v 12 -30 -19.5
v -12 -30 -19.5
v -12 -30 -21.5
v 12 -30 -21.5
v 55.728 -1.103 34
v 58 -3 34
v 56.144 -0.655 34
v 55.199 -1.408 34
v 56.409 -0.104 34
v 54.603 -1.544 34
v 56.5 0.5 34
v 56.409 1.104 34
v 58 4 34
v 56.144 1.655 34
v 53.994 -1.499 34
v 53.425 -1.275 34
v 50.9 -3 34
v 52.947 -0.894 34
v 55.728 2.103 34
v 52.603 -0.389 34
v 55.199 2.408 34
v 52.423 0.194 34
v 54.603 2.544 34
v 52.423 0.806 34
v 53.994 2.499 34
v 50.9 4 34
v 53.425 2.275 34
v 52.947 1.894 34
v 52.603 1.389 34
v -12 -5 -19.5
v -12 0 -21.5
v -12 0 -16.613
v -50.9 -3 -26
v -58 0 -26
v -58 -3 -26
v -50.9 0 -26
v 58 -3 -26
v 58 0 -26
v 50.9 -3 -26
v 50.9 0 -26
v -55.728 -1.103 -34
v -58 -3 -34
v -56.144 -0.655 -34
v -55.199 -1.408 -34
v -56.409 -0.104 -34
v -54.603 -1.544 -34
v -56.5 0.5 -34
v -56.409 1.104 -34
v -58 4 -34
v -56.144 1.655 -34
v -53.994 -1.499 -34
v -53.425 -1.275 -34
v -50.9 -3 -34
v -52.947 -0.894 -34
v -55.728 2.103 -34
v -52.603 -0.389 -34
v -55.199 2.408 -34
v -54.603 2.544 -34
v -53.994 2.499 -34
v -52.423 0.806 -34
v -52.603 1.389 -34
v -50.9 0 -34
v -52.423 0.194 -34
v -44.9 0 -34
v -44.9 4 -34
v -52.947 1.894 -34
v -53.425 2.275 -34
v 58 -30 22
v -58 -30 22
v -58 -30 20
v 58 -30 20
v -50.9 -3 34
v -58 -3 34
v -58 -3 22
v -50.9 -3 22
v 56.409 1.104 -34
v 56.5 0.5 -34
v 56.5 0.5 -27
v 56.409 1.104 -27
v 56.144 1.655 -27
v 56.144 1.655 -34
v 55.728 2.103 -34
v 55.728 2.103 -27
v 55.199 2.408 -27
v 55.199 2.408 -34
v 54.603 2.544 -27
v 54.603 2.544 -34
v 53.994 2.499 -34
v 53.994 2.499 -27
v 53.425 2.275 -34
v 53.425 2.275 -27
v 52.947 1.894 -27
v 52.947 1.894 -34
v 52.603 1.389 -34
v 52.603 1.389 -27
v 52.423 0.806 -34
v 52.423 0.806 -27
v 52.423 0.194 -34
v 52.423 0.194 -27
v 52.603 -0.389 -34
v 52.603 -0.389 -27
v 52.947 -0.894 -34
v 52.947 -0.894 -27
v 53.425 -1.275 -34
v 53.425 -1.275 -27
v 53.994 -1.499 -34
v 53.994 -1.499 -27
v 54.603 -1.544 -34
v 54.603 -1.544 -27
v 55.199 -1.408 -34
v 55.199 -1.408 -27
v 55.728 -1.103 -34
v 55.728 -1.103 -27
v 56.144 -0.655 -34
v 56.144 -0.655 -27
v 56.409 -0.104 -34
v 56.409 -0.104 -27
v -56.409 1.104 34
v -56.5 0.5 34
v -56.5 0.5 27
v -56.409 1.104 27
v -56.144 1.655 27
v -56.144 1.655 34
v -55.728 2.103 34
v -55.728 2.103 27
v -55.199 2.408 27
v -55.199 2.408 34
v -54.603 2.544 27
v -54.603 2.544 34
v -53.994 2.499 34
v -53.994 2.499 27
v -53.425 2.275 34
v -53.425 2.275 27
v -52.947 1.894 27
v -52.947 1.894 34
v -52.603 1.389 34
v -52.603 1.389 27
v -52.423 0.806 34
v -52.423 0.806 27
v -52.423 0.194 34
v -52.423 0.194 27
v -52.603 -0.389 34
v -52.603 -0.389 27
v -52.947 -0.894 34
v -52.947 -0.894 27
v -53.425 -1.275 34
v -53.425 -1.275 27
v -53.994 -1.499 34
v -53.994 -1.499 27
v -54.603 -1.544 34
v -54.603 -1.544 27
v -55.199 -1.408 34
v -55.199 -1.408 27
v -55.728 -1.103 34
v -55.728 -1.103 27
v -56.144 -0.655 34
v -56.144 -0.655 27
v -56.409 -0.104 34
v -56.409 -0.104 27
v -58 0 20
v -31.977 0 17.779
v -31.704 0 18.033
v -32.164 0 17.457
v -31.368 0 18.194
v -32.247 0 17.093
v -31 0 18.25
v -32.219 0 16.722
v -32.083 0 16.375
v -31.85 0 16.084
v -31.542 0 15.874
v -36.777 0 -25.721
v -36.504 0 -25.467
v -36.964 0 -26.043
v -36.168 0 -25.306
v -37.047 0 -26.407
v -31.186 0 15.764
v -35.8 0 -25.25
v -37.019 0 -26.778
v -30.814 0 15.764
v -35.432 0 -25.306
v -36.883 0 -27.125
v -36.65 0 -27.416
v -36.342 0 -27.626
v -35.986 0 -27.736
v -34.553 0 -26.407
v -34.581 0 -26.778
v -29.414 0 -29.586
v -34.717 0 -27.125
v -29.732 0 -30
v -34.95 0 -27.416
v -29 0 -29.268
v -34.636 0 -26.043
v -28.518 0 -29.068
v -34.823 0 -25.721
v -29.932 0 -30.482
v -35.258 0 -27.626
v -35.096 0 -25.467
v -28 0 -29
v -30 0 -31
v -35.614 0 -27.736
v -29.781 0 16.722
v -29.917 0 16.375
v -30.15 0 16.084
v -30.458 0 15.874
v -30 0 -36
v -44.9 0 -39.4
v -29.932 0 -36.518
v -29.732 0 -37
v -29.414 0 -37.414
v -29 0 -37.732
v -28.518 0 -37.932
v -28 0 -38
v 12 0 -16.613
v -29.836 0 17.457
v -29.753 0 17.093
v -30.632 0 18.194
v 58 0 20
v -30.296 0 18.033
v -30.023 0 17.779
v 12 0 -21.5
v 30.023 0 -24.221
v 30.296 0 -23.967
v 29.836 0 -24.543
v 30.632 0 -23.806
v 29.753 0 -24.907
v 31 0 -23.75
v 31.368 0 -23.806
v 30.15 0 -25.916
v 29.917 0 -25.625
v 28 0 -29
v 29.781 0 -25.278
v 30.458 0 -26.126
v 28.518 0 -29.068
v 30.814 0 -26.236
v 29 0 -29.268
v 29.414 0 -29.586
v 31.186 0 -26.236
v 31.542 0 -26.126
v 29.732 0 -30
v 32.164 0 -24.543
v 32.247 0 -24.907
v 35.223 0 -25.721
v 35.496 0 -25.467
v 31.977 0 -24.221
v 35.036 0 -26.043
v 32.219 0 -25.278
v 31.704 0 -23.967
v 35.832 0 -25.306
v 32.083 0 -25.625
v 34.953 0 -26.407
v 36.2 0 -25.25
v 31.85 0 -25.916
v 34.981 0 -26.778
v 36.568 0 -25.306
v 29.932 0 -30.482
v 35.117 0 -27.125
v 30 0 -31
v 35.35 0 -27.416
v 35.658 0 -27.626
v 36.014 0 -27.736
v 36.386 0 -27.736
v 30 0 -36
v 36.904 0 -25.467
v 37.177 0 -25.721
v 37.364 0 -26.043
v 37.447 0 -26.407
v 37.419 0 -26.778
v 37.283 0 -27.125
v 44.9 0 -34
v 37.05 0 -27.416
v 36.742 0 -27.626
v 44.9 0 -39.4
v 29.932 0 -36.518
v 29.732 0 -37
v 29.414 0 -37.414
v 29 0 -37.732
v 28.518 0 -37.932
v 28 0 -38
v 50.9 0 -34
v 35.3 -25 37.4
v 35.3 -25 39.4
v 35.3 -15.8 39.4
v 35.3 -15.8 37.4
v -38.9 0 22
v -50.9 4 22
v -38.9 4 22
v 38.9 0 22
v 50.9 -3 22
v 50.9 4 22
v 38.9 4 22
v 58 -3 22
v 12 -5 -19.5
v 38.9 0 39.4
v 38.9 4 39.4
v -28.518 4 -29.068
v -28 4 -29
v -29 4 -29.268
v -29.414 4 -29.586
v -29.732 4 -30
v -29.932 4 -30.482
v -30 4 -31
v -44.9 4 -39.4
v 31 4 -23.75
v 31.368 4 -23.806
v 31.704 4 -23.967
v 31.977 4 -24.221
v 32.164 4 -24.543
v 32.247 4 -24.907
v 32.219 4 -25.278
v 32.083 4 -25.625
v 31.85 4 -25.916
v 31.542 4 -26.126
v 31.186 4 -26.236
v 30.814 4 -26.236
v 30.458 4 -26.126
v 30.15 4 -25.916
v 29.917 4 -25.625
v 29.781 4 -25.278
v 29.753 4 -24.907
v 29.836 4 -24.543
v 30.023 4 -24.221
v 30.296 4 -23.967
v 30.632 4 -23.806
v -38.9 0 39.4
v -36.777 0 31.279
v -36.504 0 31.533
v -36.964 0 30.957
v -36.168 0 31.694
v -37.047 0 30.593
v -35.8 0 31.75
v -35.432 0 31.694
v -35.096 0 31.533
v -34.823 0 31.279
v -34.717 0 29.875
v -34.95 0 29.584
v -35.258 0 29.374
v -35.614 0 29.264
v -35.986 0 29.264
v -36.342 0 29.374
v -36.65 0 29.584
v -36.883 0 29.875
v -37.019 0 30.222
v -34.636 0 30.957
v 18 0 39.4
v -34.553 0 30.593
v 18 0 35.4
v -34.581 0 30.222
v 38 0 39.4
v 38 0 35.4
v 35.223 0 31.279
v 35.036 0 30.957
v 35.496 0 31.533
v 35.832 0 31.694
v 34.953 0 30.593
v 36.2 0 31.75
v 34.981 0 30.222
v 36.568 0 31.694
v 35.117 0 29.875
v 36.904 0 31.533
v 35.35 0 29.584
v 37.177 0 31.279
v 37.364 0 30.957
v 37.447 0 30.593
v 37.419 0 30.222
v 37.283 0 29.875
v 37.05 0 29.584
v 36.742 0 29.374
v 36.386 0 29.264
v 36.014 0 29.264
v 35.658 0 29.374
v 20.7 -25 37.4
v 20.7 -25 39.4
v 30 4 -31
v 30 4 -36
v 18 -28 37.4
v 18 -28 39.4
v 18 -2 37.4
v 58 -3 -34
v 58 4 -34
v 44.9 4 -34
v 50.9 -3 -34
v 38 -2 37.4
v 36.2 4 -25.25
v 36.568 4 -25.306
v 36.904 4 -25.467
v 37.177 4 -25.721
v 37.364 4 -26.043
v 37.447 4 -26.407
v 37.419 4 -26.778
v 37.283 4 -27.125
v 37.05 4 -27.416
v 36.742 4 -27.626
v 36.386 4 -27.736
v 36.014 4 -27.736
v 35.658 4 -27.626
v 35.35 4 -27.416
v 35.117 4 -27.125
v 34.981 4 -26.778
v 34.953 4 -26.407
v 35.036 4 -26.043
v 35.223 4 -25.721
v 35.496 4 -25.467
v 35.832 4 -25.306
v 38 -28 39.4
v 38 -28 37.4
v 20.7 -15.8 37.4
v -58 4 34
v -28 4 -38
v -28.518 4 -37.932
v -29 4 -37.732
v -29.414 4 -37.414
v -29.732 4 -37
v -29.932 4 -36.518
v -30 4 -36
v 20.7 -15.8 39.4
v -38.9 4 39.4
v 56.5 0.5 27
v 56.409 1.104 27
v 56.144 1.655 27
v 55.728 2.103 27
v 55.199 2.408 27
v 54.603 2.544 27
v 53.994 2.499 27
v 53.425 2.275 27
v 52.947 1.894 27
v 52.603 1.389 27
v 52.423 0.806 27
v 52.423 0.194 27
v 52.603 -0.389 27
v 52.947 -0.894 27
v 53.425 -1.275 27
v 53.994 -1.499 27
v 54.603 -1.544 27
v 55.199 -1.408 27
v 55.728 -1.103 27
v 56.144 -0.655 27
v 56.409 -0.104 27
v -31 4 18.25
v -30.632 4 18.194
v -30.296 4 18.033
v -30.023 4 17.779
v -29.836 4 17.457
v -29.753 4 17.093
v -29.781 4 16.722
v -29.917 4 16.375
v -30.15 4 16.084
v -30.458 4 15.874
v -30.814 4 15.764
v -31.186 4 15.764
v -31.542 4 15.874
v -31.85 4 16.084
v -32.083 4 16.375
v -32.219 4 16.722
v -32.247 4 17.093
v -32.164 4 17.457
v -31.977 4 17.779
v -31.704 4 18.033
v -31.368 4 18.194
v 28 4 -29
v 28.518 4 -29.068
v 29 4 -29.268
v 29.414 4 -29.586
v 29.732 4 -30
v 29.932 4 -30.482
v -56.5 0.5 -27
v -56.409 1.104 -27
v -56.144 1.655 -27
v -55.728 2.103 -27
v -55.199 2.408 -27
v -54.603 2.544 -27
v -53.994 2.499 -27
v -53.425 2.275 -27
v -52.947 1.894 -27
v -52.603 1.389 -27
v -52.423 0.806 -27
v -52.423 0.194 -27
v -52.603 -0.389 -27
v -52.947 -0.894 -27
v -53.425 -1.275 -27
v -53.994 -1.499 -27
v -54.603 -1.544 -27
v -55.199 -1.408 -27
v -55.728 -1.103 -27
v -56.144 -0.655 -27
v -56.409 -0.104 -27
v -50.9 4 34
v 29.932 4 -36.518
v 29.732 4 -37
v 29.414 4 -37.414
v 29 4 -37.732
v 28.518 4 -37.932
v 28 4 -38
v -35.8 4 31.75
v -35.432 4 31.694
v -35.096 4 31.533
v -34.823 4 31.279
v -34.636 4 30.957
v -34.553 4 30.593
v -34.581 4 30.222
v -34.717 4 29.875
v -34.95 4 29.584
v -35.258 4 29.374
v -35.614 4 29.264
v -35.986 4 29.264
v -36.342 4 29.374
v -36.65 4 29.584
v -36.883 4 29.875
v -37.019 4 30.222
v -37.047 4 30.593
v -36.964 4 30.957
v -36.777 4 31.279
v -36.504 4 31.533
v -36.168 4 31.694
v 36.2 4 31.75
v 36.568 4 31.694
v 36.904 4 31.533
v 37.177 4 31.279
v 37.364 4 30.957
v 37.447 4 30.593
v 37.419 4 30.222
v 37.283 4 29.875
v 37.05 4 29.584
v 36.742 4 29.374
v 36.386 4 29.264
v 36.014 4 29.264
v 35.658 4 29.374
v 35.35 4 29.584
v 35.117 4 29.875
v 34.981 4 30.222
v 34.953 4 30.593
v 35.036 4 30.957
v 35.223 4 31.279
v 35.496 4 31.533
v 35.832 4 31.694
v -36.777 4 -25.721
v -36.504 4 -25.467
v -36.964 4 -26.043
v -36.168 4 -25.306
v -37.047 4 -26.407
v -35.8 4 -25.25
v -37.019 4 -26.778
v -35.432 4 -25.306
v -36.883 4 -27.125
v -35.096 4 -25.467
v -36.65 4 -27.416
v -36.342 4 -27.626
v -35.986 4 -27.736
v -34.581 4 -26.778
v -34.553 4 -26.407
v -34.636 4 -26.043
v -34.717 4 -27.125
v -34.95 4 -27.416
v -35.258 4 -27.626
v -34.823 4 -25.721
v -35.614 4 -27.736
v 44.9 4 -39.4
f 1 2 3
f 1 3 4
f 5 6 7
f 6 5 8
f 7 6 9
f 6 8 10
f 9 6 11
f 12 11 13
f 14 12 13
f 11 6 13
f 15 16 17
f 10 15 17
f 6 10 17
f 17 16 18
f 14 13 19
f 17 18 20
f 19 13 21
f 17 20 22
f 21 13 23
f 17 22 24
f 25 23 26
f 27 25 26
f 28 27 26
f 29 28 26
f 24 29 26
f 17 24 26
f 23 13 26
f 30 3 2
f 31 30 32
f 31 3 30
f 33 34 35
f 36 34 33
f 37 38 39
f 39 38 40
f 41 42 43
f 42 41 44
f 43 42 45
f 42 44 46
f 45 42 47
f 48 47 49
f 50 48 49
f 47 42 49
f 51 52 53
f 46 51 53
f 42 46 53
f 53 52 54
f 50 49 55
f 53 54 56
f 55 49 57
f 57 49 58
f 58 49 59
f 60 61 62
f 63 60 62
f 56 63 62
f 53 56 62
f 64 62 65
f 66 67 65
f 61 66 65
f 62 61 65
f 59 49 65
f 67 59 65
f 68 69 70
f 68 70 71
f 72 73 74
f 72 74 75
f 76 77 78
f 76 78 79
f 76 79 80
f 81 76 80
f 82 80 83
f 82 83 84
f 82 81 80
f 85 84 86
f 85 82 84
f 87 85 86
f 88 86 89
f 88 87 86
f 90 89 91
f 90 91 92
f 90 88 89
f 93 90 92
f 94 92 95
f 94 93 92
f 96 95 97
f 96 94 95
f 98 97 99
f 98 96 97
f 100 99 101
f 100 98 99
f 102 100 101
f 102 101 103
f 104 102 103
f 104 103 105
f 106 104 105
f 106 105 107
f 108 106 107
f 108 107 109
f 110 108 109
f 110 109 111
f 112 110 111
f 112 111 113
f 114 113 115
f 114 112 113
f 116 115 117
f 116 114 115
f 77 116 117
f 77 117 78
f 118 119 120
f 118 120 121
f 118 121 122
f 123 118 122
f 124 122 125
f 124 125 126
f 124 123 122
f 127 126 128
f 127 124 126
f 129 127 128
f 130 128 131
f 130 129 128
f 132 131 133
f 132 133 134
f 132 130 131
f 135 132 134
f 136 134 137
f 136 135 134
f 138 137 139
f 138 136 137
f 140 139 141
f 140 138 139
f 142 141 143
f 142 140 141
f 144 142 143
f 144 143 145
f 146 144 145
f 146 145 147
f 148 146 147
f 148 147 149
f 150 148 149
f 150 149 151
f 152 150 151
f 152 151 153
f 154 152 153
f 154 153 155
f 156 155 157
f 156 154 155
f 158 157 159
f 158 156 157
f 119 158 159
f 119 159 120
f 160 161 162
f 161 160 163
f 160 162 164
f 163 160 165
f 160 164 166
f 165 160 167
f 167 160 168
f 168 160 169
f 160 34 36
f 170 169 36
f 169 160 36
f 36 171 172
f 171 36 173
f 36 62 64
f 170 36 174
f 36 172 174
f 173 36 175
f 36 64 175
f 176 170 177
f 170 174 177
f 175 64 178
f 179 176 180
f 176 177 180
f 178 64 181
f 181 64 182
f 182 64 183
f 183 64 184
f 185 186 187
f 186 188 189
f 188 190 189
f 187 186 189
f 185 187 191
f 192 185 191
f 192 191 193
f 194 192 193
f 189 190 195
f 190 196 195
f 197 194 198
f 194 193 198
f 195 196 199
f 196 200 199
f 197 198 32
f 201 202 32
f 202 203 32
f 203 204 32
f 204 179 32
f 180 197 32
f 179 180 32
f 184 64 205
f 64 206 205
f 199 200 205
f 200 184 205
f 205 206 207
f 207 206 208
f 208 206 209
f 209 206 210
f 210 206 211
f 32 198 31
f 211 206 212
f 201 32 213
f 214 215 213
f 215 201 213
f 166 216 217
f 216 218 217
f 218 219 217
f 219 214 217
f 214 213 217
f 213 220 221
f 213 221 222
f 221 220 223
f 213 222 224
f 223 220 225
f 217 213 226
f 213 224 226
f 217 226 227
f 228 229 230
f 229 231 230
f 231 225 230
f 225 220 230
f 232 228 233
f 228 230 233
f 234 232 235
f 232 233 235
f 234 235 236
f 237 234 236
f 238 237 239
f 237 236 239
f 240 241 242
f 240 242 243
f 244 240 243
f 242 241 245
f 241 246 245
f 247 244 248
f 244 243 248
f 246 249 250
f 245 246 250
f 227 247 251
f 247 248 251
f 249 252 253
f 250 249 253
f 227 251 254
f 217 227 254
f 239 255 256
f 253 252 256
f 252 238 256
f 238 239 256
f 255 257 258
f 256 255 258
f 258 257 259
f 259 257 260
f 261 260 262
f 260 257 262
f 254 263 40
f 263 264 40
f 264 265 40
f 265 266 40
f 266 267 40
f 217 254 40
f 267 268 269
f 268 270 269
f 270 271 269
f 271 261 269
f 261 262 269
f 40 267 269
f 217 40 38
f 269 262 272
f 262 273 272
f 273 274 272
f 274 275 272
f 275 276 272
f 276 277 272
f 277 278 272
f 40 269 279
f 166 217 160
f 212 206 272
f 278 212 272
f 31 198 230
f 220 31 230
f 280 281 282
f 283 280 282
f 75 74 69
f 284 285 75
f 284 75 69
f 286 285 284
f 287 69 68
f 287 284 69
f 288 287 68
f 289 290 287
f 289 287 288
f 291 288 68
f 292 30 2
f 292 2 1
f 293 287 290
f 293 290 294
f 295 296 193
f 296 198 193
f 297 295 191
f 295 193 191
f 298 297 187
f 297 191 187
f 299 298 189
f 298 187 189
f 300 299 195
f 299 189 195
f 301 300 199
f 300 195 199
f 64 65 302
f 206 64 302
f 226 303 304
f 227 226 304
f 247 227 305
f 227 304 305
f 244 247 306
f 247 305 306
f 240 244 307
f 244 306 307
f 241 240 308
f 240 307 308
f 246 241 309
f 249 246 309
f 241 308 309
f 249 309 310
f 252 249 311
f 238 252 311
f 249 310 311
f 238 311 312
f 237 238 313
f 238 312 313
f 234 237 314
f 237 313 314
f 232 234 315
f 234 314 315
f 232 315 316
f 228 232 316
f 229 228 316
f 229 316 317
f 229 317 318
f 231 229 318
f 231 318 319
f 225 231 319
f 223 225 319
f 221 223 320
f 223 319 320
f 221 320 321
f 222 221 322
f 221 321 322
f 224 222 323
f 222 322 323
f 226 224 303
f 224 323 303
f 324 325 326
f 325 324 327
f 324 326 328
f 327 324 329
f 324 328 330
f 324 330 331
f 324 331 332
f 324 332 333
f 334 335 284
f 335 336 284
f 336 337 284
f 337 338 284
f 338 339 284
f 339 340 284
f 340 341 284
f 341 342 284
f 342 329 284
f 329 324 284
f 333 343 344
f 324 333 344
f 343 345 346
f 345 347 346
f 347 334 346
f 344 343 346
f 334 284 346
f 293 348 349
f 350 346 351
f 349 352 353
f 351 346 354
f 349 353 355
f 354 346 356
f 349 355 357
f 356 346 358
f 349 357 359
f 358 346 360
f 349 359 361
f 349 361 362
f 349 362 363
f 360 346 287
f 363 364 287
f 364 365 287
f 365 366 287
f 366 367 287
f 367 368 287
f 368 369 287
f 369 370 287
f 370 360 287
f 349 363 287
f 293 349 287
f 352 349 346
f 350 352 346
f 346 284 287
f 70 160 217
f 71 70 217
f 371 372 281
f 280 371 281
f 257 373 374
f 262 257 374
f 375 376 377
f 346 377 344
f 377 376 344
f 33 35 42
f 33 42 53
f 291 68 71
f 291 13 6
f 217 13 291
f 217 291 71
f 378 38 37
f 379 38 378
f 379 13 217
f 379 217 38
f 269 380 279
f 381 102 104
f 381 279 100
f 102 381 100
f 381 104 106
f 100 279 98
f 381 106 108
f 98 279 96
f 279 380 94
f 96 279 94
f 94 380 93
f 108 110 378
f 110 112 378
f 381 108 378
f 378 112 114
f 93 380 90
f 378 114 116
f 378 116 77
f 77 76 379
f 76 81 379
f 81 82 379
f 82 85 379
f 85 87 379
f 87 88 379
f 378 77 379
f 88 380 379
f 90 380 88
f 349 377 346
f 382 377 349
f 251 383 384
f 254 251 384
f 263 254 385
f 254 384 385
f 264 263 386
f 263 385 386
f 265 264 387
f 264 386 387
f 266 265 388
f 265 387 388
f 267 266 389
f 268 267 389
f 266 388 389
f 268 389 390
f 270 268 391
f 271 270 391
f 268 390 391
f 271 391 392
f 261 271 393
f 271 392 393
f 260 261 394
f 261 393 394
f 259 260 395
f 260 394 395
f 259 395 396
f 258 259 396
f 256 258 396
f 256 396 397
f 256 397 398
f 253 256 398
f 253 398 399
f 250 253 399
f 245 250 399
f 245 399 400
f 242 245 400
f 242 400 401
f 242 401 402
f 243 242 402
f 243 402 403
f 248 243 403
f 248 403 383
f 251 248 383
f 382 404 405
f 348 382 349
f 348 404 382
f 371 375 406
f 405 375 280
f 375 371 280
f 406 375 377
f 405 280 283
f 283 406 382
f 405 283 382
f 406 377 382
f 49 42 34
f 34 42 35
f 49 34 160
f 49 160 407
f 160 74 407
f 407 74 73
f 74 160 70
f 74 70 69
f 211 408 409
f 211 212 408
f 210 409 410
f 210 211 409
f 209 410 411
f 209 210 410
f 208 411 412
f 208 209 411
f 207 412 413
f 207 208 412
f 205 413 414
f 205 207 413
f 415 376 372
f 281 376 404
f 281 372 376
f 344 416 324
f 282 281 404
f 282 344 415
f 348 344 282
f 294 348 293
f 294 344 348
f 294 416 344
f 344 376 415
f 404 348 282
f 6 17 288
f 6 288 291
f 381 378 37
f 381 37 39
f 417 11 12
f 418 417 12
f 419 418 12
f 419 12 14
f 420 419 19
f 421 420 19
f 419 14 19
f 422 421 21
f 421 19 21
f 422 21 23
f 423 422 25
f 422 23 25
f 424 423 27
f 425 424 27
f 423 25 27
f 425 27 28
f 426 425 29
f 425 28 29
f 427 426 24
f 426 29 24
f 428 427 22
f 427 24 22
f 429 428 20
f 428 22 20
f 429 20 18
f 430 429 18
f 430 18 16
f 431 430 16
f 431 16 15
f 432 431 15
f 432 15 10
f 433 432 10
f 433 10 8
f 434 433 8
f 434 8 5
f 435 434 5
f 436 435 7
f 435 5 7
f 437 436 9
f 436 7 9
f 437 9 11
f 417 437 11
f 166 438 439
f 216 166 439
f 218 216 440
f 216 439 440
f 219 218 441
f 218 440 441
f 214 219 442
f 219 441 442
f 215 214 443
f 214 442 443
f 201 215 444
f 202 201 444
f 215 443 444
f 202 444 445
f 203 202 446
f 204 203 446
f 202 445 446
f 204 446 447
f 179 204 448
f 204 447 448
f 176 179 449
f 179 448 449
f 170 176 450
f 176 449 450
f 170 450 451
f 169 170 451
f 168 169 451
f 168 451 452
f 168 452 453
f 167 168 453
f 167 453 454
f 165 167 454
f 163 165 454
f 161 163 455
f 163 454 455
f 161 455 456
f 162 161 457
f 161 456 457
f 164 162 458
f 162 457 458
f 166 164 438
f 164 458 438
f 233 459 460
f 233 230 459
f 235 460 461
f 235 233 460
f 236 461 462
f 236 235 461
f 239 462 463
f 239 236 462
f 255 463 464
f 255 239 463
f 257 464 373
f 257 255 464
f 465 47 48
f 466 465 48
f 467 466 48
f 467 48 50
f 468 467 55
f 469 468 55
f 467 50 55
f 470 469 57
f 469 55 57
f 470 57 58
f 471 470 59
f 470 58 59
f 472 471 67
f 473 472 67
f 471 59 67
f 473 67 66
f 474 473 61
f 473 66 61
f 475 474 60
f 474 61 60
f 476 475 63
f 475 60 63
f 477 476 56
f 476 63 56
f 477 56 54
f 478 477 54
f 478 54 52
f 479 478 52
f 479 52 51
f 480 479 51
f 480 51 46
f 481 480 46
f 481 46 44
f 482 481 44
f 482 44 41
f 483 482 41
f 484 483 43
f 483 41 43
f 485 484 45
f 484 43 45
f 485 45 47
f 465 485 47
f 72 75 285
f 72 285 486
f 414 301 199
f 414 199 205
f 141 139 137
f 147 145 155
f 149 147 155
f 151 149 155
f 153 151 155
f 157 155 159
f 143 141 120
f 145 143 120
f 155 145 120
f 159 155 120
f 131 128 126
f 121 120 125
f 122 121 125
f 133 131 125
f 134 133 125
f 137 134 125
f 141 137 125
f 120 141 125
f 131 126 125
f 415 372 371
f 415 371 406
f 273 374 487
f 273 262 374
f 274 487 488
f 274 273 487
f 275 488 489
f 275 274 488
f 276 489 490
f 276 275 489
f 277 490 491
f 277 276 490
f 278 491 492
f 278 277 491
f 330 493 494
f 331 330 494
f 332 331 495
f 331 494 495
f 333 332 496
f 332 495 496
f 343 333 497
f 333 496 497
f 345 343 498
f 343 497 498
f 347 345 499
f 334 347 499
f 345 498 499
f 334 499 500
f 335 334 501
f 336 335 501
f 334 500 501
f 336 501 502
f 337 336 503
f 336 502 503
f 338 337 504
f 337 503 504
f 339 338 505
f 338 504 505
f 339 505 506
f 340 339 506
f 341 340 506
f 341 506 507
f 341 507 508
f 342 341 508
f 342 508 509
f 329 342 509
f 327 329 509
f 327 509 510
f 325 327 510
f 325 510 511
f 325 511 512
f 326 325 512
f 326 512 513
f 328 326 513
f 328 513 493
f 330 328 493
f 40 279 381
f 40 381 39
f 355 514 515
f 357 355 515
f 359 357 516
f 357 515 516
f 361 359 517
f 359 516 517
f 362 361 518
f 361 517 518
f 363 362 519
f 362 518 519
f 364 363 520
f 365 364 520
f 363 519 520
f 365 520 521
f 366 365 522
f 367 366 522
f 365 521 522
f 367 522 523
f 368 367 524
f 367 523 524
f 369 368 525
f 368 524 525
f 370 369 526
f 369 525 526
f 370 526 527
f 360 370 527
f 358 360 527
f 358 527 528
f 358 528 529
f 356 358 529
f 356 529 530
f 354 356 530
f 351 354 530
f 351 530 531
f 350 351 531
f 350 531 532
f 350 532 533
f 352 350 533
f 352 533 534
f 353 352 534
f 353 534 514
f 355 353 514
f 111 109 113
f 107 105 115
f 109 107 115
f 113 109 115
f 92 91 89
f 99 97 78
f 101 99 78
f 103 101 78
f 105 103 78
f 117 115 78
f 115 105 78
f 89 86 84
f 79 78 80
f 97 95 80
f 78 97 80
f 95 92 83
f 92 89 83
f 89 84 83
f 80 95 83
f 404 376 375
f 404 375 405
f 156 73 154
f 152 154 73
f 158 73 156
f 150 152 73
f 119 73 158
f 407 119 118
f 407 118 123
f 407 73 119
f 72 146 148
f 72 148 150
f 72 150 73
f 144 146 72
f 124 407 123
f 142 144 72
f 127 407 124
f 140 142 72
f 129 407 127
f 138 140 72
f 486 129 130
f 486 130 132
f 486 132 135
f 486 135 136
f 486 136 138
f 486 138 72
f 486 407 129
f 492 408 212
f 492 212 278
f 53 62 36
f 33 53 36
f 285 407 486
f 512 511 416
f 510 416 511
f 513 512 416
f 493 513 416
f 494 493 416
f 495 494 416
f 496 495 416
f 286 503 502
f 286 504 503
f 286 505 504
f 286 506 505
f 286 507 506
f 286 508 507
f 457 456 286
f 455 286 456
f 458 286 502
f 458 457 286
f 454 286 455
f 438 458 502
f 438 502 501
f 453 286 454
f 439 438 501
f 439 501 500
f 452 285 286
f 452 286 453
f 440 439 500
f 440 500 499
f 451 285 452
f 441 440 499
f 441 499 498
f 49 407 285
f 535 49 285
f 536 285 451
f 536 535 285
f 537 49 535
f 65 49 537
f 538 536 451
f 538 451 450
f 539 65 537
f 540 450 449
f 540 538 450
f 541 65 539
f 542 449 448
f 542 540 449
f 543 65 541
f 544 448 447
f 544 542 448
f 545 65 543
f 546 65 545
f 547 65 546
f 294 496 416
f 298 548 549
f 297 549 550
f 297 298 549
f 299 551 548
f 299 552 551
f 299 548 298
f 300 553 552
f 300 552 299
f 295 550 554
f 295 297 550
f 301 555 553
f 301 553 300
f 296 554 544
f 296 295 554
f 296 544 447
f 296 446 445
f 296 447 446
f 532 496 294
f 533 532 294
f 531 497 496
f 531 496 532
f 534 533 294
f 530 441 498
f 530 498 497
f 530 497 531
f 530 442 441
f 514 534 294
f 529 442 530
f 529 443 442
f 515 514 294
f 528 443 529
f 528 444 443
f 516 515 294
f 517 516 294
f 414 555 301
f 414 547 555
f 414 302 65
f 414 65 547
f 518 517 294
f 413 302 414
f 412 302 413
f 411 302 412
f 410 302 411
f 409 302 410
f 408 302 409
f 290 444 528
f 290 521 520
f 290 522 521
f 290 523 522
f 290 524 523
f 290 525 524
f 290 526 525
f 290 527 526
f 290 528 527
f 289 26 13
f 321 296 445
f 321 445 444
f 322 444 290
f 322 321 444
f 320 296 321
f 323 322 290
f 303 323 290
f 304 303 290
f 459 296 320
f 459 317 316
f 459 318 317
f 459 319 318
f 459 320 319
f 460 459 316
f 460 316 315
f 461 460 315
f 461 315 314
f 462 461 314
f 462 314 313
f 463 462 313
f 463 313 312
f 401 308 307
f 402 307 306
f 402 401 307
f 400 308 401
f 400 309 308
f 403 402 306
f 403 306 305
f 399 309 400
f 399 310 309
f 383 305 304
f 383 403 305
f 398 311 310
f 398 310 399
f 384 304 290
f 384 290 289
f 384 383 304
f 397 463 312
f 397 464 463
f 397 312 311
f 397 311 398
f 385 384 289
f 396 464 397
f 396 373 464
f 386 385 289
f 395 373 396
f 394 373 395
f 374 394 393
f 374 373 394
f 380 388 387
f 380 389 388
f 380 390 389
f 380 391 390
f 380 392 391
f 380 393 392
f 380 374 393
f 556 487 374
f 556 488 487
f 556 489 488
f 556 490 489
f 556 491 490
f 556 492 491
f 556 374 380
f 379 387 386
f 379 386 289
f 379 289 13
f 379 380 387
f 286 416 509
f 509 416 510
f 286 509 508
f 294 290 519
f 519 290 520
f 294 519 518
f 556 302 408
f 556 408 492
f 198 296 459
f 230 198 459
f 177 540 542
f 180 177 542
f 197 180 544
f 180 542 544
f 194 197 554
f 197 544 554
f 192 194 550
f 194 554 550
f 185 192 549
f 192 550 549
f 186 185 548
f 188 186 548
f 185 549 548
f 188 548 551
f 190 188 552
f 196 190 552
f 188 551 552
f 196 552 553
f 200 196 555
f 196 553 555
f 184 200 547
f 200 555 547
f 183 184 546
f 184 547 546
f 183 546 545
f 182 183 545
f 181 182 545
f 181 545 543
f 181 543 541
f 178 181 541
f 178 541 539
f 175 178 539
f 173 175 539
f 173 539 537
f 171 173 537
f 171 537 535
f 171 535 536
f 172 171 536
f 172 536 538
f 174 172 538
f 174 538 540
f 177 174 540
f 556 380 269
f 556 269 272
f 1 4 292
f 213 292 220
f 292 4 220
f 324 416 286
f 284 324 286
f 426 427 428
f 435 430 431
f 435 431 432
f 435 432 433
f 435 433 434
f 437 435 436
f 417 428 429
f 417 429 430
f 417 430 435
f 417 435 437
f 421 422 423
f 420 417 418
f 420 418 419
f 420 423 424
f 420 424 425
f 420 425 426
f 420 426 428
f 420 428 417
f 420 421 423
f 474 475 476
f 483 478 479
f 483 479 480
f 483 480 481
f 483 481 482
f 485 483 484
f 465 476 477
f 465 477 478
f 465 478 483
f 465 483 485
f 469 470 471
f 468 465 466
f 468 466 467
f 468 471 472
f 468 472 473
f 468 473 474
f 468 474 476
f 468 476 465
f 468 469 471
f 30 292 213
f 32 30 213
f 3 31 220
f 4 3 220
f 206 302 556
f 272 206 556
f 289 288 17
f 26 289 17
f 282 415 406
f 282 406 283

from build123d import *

# Parameters (mm, degrees)
BOSS_EXTRUDE1_DEPTH             = 4
SKETCH3_W                       = 7.1
SKETCH3_H                       = 8
BOSS_EXTRUDE3_DEPTH             = 3
SKETCH4_R                       = 2.05
CUT_EXTRUDE1_DEPTH              = 7
MIRROR2_COPY_1_SKETCH_W         = 7.1
MIRROR2_COPY_1_SKETCH_H         = 8
MIRROR2_COPY_1_DEPTH            = 3
MIRROR2_COPY_2_SKETCH_R         = 2.05
MIRROR2_COPY_2_DEPTH            = 7
SKETCH5_W                       = 60
SKETCH5_H                       = 9
CUT_EXTRUDE2_DEPTH              = 72.37226352
FILLET1_R                       = 2
SKETCH7_W                       = 101.8
SKETCH7_H                       = 1
CUT_EXTRUDE3_DEPTH              = 72.37226352
SKETCH8_W                       = 116
SKETCH8_H                       = 2
BOSS_EXTRUDE4_DEPTH             = 30
SKETCH9_W                       = 12
SKETCH9_H                       = 18
CUT_EXTRUDE4_DEPTH              = 10
SKETCH10_W                      = 7.1
SKETCH10_H                      = 4
BOSS_EXTRUDE5_DEPTH             = 3
SKETCH12_W                      = 1.5
SKETCH12_H                      = 4
BOSS_EXTRUDE6_DEPTH             = 2
SKETCH13_W                      = 36
SKETCH13_H                      = 2
BOSS_EXTRUDE7_DEPTH             = 30
SKETCH14_W                      = 1.5
SKETCH14_H                      = 4
BOSS_EXTRUDE8_DEPTH             = 1
BOSS_EXTRUDE9_REACH             = 79.055
BOSS_EXTRUDE9_DIRECTION_2_REACH = 79.055
SKETCH16_W                      = 20
SKETCH16_H                      = 28
SKETCH16_W_2                    = 14.6
SKETCH16_H_2                    = 9.2
BOSS_EXTRUDE10_DEPTH            = 2.6
SKETCH17_W                      = 12
SKETCH17_H                      = 18
CUT_EXTRUDE5_DEPTH              = 78.054785705
SKETCH18_W                      = 6
SKETCH18_H                      = 6
CUT_EXTRUDE6_DEPTH              = 79.759380394
SKETCH22_R                      = 1.25
CUT_EXTRUDE7_DEPTH              = 4
SKETCH25_W                      = 6
SKETCH25_H                      = 30
CUT_EXTRUDE11_DEPTH             = 10
SKETCH26_W                      = 5.701552738
SKETCH26_H                      = 30.562488548
SKETCH26_W_2                    = 6.53419365
SKETCH26_H_2                    = 28.524331859
CUT_EXTRUDE12_DEPTH             = 78.810282097
CUT_EXTRUDE12_DEPTH_BACK        = 78.810282097
SKETCH27_R                      = 1.25
CUT_EXTRUDE13_DEPTH             = 79.230428862
SKETCH28_W                      = 89.8
SKETCH28_H                      = 0.6
SKETCH28_W_2                    = 77.8
CUT_EXTRUDE14_DEPTH             = 79.230428862
CHAMFER1_SIZE                   = 2


with BuildPart() as part:
    # Sketch1 → Boss-Extrude1 (new body)
    with BuildSketch(Plane(origin=(0, 0, 0), x_dir=(1, 0, 0), z_dir=(0, 1, 0))):
        Polygon((-58, -34), (-50.9, -34), (-50.9, -41), (50.9, -41), (50.9, -34), (58, -34), (58, 34), (50.9, 34), (50.9, 41), (-50.9, 41), (-50.9, 34), (-58, 34), align=None)
    extrude(amount=BOSS_EXTRUDE1_DEPTH)

    # Sketch3 → Boss-Extrude3 (add)
    with BuildSketch(Plane.XZ):
        with Locations((-54.45, -30)):
            Rectangle(SKETCH3_W, SKETCH3_H)
    boss_extrude3 = extrude(amount=BOSS_EXTRUDE3_DEPTH)

    # Sketch4 → Cut-Extrude1 (cut)
    with BuildSketch(Plane(origin=(0, 0, -34), x_dir=(-1, 0, 0), z_dir=(0, 0, -1))):
        with Locations((54.45, 0.5)):
            Circle(SKETCH4_R)
    cut_extrude1 = extrude(amount=-CUT_EXTRUDE1_DEPTH, mode=Mode.SUBTRACT)

    # Mirror1: Boss-Extrude3, Cut-Extrude1 across plane
    add(boss_extrude3.mirror(Plane(origin=(0, 0, 0), x_dir=(0, 0, 1), z_dir=(1, 0, 0))))
    add(cut_extrude1.mirror(Plane(origin=(0, 0, 0), x_dir=(0, 0, 1), z_dir=(1, 0, 0))), mode=Mode.SUBTRACT)

    # Mirror2: Boss-Extrude3, Cut-Extrude1 across plane
    add(boss_extrude3.mirror(Plane.XY))
    add(cut_extrude1.mirror(Plane.XY), mode=Mode.SUBTRACT)

    # Mirror2 copy 1 sketch → Mirror2 copy 1 (add)
    with BuildSketch(Plane(origin=(0, 0, 0), x_dir=(-1, 0, 0), z_dir=(0, -1, 0))):
        with Locations((-54.45, -30)):
            Rectangle(MIRROR2_COPY_1_SKETCH_W, MIRROR2_COPY_1_SKETCH_H)
    extrude(amount=MIRROR2_COPY_1_DEPTH)

    # Mirror2 copy 2 sketch → Mirror2 copy 2 (cut)
    with BuildSketch(Plane.XY.offset(34)):
        with Locations((54.45, 0.5)):
            Circle(MIRROR2_COPY_2_SKETCH_R)
    extrude(amount=-MIRROR2_COPY_2_DEPTH, mode=Mode.SUBTRACT)

    # Sketch5 → Cut-Extrude2 (cut, through all)
    with BuildSketch(Plane(origin=(0, 4, 0), x_dir=(1, 0, 0), z_dir=(0, 1, 0))):
        with Locations((0, 33.5)):
            Rectangle(SKETCH5_W, SKETCH5_H)
    extrude(amount=-CUT_EXTRUDE2_DEPTH, mode=Mode.SUBTRACT)

    # Fillet1
    fillet1_edges = [part.edges().sort_by_distance(p)[0] for p in [
        (-30, 2, -29),
        (-30, 2, -38),
        (30, 2, -38),
        (30, 2, -29),
    ]]
    fillet(fillet1_edges, radius=FILLET1_R)

    # Sketch7 → Cut-Extrude3 (cut, through all)
    with BuildSketch(Plane(origin=(0, 4, 0), x_dir=(1, 0, 0), z_dir=(0, 1, 0))):
        with Locations((0, 40.5)):
            Rectangle(SKETCH7_W, SKETCH7_H)
        with Locations((0, -40.5)):
            Rectangle(SKETCH7_W, SKETCH7_H)
    extrude(amount=-CUT_EXTRUDE3_DEPTH, mode=Mode.SUBTRACT)

    # Sketch8 → Boss-Extrude4 (add)
    with BuildSketch(Plane.XZ):
        with Locations((0, 21)):
            Rectangle(SKETCH8_W, SKETCH8_H)
    extrude(amount=BOSS_EXTRUDE4_DEPTH)

    # Sketch9 → Cut-Extrude4 (cut)
    with BuildSketch(Plane(origin=(0, 4, 0), x_dir=(1, 0, 0), z_dir=(0, 1, 0))):
        with Locations((-44.9, -31)):
            Rectangle(SKETCH9_W, SKETCH9_H)
    extrude(amount=-CUT_EXTRUDE4_DEPTH, mode=Mode.SUBTRACT)

    # Sketch10 → Boss-Extrude5 (add)
    with BuildSketch(Plane.XZ.offset(3)):
        with Locations((-54.45, 24)):
            Rectangle(SKETCH10_W, SKETCH10_H)
        with Locations((54.45, 24)):
            Rectangle(SKETCH10_W, SKETCH10_H)
    extrude(amount=-BOSS_EXTRUDE5_DEPTH)

    # Sketch12 → Boss-Extrude6 (add)
    with BuildSketch(Plane.ZY.offset(51)):
        Polygon((22, -5.8), (22, -16.2), (24.7, -13.5), (24.7, -8.5), align=None)
        with Locations((23.35, -11)):
            Rectangle(SKETCH12_W, SKETCH12_H, mode=Mode.SUBTRACT)
        Polygon((22, -20.8), (22, -31.2), (24.7, -28.5), (24.7, -23.5), align=None)
        with Locations((23.35, -26)):
            Rectangle(SKETCH12_W, SKETCH12_H, mode=Mode.SUBTRACT)
    boss_extrude6 = extrude(amount=-BOSS_EXTRUDE6_DEPTH)

    # Mirror3: Boss-Extrude6 across plane
    add(boss_extrude6.mirror(Plane(origin=(-44.9, 0, 0), x_dir=(0, 0, 1), z_dir=(1, 0, 0))))

    # Sketch13 → Boss-Extrude7 (add)
    with BuildSketch(Plane.XZ):
        with Locations((0, -20.5)):
            Rectangle(SKETCH13_W, SKETCH13_H)
    extrude(amount=BOSS_EXTRUDE7_DEPTH)

    # Sketch14 → Boss-Extrude8 (add, symmetric)
    with BuildSketch(Plane(origin=(0, 0, 0), x_dir=(0, 0, -1), z_dir=(1, 0, 0))):
        Polygon((24.2, -8.5), (21.5, -5.8), (21.5, -16.2), (24.2, -13.5), align=None)
        with Locations((22.85, -11)):
            Rectangle(SKETCH14_W, SKETCH14_H, mode=Mode.SUBTRACT)
    extrude(amount=BOSS_EXTRUDE8_DEPTH, both=True)

    # Boss-Extrude9: up to this face of the body (flat: up to its plane)
    boss_extrude9_end = Plane(part.part.faces().sort_by_distance((-18, -15, -20.5))[0])
    # Sketch15 → Boss-Extrude9 (add, up to the picked face)
    with BuildSketch(Plane(origin=(0, 0, 0), x_dir=(0, 0, -1), z_dir=(1, 0, 0)), mode=Mode.PRIVATE) as boss_extrude9_sk1:
        Polygon((19.5, 0), (19.5, -5), (16.613248654, 0), align=None)
    boss_extrude9_tool1 = split(extrude(boss_extrude9_sk1.sketch, amount=-BOSS_EXTRUDE9_REACH, mode=Mode.PRIVATE), bisect_by=boss_extrude9_end, keep=Keep.BOTH, mode=Mode.PRIVATE)
    add(boss_extrude9_tool1.solids().sort_by(Axis((0, -1.666667, -18.53775), (-1, 0, 0)))[0])

    # Boss-Extrude9 direction 2: up to this face of the body (flat: up to its plane)
    boss_extrude9_direction_2_end = Plane(part.part.faces().sort_by_distance((18, -15, -20.5))[0])
    # Sketch15 → Boss-Extrude9 direction 2 (add, up to the picked face)
    with BuildSketch(Plane(origin=(0, 0, 0), x_dir=(0, 0, -1), z_dir=(1, 0, 0)), mode=Mode.PRIVATE) as boss_extrude9_direction_2_sk1:
        Polygon((19.5, 0), (19.5, -5), (16.613248654, 0), align=None)
    boss_extrude9_direction_2_tool1 = split(extrude(boss_extrude9_direction_2_sk1.sketch, amount=BOSS_EXTRUDE9_DIRECTION_2_REACH, mode=Mode.PRIVATE), bisect_by=boss_extrude9_direction_2_end, keep=Keep.BOTH, mode=Mode.PRIVATE)
    add(boss_extrude9_direction_2_tool1.solids().sort_by(Axis((0, -1.666667, -18.53775), (1, 0, 0)))[0])

    # Sketch16 → Boss-Extrude10 (add)
    with BuildSketch(Plane.XY.offset(40)):
        with Locations((28, -14)):
            Rectangle(SKETCH16_W, SKETCH16_H)
        with Locations((28, -20.4)):
            Rectangle(SKETCH16_W_2, SKETCH16_H_2, mode=Mode.SUBTRACT)
    extrude(amount=-BOSS_EXTRUDE10_DEPTH)

    # Sketch17 → Cut-Extrude5 (cut, through all)
    with BuildSketch(Plane.XZ):
        with Locations((44.9, 31)):
            Rectangle(SKETCH17_W, SKETCH17_H)
    extrude(amount=-CUT_EXTRUDE5_DEPTH, mode=Mode.SUBTRACT)

    # Sketch18 → Cut-Extrude6 (cut, through all)
    with BuildSketch(Plane(origin=(0, 4, 0), x_dir=(1, 0, 0), z_dir=(0, 1, 0))):
        with Locations((47.9, 37)):
            Rectangle(SKETCH18_W, SKETCH18_H)
        with Locations((-47.9, 37)):
            Rectangle(SKETCH18_W, SKETCH18_H)
    extrude(amount=-CUT_EXTRUDE6_DEPTH, mode=Mode.SUBTRACT)

    # Sketch22 → Cut-Extrude7 (cut)
    with BuildSketch(Plane(origin=(0, 4, 0), x_dir=(1, 0, 0), z_dir=(0, 1, 0))):
        with Locations(Location((31, 25, 0), (0, 0, 270))):
            Circle(SKETCH22_R)
        with Locations(Location((-31, -17, 0), (0, 0, 270))):
            Circle(SKETCH22_R)
    extrude(amount=-CUT_EXTRUDE7_DEPTH, mode=Mode.SUBTRACT)

    # Sketch25 → Cut-Extrude11 (cut)
    with BuildSketch(Plane(origin=(0, 0, -21.5), x_dir=(-1, 0, 0), z_dir=(0, 0, -1))):
        with Locations((-15, -15)):
            Rectangle(SKETCH25_W, SKETCH25_H)
        with Locations((15, -15)):
            Rectangle(SKETCH25_W, SKETCH25_H)
    extrude(amount=-CUT_EXTRUDE11_DEPTH, mode=Mode.SUBTRACT)

    # Sketch26 → Cut-Extrude12 (cut, two sides)
    with BuildSketch(Plane.ZY.offset(1)) as cut_extrude12_sk:
        with Locations((-24.350776369, -21.081244274)):
            Rectangle(SKETCH26_W, SKETCH26_H)
        with Locations((25.267096825, -20.06216593)):
            Rectangle(SKETCH26_W_2, SKETCH26_H_2)
    extrude(amount=CUT_EXTRUDE12_DEPTH, mode=Mode.SUBTRACT)
    extrude(cut_extrude12_sk.sketch, amount=-CUT_EXTRUDE12_DEPTH_BACK, mode=Mode.SUBTRACT)

    # Sketch27 → Cut-Extrude13 (cut, through all)
    with BuildSketch(Plane(origin=(0, 4, 0), x_dir=(1, 0, 0), z_dir=(0, 1, 0))):
        with Locations(Location((-35.8, 26.5, 0), (0, 0, 270))):
            Circle(SKETCH27_R)
        with Locations(Location((-35.8, -30.5, 0), (0, 0, 270))):
            Circle(SKETCH27_R)
        with Locations(Location((36.2, -30.5, 0), (0, 0, 270))):
            Circle(SKETCH27_R)
        with Locations(Location((36.2, 26.5, 0), (0, 0, 270))):
            Circle(SKETCH27_R)
    extrude(amount=-CUT_EXTRUDE13_DEPTH, mode=Mode.SUBTRACT)

    # Sketch28 → Cut-Extrude14 (cut, through all)
    with BuildSketch(Plane(origin=(0, 4, 0), x_dir=(1, 0, 0), z_dir=(0, 1, 0))):
        with Locations((0, 39.7)):
            Rectangle(SKETCH28_W, SKETCH28_H)
        with Locations((0, -39.7)):
            Rectangle(SKETCH28_W_2, SKETCH28_H)
    extrude(amount=-CUT_EXTRUDE14_DEPTH, mode=Mode.SUBTRACT)

    # Chamfer1
    chamfer1_edges = [part.edges().sort_by_distance(p)[0] for p in [
        (28, 0, 37.4),
    ]]
    chamfer(chamfer1_edges, length=CHAMFER1_SIZE)


solid = part.part
